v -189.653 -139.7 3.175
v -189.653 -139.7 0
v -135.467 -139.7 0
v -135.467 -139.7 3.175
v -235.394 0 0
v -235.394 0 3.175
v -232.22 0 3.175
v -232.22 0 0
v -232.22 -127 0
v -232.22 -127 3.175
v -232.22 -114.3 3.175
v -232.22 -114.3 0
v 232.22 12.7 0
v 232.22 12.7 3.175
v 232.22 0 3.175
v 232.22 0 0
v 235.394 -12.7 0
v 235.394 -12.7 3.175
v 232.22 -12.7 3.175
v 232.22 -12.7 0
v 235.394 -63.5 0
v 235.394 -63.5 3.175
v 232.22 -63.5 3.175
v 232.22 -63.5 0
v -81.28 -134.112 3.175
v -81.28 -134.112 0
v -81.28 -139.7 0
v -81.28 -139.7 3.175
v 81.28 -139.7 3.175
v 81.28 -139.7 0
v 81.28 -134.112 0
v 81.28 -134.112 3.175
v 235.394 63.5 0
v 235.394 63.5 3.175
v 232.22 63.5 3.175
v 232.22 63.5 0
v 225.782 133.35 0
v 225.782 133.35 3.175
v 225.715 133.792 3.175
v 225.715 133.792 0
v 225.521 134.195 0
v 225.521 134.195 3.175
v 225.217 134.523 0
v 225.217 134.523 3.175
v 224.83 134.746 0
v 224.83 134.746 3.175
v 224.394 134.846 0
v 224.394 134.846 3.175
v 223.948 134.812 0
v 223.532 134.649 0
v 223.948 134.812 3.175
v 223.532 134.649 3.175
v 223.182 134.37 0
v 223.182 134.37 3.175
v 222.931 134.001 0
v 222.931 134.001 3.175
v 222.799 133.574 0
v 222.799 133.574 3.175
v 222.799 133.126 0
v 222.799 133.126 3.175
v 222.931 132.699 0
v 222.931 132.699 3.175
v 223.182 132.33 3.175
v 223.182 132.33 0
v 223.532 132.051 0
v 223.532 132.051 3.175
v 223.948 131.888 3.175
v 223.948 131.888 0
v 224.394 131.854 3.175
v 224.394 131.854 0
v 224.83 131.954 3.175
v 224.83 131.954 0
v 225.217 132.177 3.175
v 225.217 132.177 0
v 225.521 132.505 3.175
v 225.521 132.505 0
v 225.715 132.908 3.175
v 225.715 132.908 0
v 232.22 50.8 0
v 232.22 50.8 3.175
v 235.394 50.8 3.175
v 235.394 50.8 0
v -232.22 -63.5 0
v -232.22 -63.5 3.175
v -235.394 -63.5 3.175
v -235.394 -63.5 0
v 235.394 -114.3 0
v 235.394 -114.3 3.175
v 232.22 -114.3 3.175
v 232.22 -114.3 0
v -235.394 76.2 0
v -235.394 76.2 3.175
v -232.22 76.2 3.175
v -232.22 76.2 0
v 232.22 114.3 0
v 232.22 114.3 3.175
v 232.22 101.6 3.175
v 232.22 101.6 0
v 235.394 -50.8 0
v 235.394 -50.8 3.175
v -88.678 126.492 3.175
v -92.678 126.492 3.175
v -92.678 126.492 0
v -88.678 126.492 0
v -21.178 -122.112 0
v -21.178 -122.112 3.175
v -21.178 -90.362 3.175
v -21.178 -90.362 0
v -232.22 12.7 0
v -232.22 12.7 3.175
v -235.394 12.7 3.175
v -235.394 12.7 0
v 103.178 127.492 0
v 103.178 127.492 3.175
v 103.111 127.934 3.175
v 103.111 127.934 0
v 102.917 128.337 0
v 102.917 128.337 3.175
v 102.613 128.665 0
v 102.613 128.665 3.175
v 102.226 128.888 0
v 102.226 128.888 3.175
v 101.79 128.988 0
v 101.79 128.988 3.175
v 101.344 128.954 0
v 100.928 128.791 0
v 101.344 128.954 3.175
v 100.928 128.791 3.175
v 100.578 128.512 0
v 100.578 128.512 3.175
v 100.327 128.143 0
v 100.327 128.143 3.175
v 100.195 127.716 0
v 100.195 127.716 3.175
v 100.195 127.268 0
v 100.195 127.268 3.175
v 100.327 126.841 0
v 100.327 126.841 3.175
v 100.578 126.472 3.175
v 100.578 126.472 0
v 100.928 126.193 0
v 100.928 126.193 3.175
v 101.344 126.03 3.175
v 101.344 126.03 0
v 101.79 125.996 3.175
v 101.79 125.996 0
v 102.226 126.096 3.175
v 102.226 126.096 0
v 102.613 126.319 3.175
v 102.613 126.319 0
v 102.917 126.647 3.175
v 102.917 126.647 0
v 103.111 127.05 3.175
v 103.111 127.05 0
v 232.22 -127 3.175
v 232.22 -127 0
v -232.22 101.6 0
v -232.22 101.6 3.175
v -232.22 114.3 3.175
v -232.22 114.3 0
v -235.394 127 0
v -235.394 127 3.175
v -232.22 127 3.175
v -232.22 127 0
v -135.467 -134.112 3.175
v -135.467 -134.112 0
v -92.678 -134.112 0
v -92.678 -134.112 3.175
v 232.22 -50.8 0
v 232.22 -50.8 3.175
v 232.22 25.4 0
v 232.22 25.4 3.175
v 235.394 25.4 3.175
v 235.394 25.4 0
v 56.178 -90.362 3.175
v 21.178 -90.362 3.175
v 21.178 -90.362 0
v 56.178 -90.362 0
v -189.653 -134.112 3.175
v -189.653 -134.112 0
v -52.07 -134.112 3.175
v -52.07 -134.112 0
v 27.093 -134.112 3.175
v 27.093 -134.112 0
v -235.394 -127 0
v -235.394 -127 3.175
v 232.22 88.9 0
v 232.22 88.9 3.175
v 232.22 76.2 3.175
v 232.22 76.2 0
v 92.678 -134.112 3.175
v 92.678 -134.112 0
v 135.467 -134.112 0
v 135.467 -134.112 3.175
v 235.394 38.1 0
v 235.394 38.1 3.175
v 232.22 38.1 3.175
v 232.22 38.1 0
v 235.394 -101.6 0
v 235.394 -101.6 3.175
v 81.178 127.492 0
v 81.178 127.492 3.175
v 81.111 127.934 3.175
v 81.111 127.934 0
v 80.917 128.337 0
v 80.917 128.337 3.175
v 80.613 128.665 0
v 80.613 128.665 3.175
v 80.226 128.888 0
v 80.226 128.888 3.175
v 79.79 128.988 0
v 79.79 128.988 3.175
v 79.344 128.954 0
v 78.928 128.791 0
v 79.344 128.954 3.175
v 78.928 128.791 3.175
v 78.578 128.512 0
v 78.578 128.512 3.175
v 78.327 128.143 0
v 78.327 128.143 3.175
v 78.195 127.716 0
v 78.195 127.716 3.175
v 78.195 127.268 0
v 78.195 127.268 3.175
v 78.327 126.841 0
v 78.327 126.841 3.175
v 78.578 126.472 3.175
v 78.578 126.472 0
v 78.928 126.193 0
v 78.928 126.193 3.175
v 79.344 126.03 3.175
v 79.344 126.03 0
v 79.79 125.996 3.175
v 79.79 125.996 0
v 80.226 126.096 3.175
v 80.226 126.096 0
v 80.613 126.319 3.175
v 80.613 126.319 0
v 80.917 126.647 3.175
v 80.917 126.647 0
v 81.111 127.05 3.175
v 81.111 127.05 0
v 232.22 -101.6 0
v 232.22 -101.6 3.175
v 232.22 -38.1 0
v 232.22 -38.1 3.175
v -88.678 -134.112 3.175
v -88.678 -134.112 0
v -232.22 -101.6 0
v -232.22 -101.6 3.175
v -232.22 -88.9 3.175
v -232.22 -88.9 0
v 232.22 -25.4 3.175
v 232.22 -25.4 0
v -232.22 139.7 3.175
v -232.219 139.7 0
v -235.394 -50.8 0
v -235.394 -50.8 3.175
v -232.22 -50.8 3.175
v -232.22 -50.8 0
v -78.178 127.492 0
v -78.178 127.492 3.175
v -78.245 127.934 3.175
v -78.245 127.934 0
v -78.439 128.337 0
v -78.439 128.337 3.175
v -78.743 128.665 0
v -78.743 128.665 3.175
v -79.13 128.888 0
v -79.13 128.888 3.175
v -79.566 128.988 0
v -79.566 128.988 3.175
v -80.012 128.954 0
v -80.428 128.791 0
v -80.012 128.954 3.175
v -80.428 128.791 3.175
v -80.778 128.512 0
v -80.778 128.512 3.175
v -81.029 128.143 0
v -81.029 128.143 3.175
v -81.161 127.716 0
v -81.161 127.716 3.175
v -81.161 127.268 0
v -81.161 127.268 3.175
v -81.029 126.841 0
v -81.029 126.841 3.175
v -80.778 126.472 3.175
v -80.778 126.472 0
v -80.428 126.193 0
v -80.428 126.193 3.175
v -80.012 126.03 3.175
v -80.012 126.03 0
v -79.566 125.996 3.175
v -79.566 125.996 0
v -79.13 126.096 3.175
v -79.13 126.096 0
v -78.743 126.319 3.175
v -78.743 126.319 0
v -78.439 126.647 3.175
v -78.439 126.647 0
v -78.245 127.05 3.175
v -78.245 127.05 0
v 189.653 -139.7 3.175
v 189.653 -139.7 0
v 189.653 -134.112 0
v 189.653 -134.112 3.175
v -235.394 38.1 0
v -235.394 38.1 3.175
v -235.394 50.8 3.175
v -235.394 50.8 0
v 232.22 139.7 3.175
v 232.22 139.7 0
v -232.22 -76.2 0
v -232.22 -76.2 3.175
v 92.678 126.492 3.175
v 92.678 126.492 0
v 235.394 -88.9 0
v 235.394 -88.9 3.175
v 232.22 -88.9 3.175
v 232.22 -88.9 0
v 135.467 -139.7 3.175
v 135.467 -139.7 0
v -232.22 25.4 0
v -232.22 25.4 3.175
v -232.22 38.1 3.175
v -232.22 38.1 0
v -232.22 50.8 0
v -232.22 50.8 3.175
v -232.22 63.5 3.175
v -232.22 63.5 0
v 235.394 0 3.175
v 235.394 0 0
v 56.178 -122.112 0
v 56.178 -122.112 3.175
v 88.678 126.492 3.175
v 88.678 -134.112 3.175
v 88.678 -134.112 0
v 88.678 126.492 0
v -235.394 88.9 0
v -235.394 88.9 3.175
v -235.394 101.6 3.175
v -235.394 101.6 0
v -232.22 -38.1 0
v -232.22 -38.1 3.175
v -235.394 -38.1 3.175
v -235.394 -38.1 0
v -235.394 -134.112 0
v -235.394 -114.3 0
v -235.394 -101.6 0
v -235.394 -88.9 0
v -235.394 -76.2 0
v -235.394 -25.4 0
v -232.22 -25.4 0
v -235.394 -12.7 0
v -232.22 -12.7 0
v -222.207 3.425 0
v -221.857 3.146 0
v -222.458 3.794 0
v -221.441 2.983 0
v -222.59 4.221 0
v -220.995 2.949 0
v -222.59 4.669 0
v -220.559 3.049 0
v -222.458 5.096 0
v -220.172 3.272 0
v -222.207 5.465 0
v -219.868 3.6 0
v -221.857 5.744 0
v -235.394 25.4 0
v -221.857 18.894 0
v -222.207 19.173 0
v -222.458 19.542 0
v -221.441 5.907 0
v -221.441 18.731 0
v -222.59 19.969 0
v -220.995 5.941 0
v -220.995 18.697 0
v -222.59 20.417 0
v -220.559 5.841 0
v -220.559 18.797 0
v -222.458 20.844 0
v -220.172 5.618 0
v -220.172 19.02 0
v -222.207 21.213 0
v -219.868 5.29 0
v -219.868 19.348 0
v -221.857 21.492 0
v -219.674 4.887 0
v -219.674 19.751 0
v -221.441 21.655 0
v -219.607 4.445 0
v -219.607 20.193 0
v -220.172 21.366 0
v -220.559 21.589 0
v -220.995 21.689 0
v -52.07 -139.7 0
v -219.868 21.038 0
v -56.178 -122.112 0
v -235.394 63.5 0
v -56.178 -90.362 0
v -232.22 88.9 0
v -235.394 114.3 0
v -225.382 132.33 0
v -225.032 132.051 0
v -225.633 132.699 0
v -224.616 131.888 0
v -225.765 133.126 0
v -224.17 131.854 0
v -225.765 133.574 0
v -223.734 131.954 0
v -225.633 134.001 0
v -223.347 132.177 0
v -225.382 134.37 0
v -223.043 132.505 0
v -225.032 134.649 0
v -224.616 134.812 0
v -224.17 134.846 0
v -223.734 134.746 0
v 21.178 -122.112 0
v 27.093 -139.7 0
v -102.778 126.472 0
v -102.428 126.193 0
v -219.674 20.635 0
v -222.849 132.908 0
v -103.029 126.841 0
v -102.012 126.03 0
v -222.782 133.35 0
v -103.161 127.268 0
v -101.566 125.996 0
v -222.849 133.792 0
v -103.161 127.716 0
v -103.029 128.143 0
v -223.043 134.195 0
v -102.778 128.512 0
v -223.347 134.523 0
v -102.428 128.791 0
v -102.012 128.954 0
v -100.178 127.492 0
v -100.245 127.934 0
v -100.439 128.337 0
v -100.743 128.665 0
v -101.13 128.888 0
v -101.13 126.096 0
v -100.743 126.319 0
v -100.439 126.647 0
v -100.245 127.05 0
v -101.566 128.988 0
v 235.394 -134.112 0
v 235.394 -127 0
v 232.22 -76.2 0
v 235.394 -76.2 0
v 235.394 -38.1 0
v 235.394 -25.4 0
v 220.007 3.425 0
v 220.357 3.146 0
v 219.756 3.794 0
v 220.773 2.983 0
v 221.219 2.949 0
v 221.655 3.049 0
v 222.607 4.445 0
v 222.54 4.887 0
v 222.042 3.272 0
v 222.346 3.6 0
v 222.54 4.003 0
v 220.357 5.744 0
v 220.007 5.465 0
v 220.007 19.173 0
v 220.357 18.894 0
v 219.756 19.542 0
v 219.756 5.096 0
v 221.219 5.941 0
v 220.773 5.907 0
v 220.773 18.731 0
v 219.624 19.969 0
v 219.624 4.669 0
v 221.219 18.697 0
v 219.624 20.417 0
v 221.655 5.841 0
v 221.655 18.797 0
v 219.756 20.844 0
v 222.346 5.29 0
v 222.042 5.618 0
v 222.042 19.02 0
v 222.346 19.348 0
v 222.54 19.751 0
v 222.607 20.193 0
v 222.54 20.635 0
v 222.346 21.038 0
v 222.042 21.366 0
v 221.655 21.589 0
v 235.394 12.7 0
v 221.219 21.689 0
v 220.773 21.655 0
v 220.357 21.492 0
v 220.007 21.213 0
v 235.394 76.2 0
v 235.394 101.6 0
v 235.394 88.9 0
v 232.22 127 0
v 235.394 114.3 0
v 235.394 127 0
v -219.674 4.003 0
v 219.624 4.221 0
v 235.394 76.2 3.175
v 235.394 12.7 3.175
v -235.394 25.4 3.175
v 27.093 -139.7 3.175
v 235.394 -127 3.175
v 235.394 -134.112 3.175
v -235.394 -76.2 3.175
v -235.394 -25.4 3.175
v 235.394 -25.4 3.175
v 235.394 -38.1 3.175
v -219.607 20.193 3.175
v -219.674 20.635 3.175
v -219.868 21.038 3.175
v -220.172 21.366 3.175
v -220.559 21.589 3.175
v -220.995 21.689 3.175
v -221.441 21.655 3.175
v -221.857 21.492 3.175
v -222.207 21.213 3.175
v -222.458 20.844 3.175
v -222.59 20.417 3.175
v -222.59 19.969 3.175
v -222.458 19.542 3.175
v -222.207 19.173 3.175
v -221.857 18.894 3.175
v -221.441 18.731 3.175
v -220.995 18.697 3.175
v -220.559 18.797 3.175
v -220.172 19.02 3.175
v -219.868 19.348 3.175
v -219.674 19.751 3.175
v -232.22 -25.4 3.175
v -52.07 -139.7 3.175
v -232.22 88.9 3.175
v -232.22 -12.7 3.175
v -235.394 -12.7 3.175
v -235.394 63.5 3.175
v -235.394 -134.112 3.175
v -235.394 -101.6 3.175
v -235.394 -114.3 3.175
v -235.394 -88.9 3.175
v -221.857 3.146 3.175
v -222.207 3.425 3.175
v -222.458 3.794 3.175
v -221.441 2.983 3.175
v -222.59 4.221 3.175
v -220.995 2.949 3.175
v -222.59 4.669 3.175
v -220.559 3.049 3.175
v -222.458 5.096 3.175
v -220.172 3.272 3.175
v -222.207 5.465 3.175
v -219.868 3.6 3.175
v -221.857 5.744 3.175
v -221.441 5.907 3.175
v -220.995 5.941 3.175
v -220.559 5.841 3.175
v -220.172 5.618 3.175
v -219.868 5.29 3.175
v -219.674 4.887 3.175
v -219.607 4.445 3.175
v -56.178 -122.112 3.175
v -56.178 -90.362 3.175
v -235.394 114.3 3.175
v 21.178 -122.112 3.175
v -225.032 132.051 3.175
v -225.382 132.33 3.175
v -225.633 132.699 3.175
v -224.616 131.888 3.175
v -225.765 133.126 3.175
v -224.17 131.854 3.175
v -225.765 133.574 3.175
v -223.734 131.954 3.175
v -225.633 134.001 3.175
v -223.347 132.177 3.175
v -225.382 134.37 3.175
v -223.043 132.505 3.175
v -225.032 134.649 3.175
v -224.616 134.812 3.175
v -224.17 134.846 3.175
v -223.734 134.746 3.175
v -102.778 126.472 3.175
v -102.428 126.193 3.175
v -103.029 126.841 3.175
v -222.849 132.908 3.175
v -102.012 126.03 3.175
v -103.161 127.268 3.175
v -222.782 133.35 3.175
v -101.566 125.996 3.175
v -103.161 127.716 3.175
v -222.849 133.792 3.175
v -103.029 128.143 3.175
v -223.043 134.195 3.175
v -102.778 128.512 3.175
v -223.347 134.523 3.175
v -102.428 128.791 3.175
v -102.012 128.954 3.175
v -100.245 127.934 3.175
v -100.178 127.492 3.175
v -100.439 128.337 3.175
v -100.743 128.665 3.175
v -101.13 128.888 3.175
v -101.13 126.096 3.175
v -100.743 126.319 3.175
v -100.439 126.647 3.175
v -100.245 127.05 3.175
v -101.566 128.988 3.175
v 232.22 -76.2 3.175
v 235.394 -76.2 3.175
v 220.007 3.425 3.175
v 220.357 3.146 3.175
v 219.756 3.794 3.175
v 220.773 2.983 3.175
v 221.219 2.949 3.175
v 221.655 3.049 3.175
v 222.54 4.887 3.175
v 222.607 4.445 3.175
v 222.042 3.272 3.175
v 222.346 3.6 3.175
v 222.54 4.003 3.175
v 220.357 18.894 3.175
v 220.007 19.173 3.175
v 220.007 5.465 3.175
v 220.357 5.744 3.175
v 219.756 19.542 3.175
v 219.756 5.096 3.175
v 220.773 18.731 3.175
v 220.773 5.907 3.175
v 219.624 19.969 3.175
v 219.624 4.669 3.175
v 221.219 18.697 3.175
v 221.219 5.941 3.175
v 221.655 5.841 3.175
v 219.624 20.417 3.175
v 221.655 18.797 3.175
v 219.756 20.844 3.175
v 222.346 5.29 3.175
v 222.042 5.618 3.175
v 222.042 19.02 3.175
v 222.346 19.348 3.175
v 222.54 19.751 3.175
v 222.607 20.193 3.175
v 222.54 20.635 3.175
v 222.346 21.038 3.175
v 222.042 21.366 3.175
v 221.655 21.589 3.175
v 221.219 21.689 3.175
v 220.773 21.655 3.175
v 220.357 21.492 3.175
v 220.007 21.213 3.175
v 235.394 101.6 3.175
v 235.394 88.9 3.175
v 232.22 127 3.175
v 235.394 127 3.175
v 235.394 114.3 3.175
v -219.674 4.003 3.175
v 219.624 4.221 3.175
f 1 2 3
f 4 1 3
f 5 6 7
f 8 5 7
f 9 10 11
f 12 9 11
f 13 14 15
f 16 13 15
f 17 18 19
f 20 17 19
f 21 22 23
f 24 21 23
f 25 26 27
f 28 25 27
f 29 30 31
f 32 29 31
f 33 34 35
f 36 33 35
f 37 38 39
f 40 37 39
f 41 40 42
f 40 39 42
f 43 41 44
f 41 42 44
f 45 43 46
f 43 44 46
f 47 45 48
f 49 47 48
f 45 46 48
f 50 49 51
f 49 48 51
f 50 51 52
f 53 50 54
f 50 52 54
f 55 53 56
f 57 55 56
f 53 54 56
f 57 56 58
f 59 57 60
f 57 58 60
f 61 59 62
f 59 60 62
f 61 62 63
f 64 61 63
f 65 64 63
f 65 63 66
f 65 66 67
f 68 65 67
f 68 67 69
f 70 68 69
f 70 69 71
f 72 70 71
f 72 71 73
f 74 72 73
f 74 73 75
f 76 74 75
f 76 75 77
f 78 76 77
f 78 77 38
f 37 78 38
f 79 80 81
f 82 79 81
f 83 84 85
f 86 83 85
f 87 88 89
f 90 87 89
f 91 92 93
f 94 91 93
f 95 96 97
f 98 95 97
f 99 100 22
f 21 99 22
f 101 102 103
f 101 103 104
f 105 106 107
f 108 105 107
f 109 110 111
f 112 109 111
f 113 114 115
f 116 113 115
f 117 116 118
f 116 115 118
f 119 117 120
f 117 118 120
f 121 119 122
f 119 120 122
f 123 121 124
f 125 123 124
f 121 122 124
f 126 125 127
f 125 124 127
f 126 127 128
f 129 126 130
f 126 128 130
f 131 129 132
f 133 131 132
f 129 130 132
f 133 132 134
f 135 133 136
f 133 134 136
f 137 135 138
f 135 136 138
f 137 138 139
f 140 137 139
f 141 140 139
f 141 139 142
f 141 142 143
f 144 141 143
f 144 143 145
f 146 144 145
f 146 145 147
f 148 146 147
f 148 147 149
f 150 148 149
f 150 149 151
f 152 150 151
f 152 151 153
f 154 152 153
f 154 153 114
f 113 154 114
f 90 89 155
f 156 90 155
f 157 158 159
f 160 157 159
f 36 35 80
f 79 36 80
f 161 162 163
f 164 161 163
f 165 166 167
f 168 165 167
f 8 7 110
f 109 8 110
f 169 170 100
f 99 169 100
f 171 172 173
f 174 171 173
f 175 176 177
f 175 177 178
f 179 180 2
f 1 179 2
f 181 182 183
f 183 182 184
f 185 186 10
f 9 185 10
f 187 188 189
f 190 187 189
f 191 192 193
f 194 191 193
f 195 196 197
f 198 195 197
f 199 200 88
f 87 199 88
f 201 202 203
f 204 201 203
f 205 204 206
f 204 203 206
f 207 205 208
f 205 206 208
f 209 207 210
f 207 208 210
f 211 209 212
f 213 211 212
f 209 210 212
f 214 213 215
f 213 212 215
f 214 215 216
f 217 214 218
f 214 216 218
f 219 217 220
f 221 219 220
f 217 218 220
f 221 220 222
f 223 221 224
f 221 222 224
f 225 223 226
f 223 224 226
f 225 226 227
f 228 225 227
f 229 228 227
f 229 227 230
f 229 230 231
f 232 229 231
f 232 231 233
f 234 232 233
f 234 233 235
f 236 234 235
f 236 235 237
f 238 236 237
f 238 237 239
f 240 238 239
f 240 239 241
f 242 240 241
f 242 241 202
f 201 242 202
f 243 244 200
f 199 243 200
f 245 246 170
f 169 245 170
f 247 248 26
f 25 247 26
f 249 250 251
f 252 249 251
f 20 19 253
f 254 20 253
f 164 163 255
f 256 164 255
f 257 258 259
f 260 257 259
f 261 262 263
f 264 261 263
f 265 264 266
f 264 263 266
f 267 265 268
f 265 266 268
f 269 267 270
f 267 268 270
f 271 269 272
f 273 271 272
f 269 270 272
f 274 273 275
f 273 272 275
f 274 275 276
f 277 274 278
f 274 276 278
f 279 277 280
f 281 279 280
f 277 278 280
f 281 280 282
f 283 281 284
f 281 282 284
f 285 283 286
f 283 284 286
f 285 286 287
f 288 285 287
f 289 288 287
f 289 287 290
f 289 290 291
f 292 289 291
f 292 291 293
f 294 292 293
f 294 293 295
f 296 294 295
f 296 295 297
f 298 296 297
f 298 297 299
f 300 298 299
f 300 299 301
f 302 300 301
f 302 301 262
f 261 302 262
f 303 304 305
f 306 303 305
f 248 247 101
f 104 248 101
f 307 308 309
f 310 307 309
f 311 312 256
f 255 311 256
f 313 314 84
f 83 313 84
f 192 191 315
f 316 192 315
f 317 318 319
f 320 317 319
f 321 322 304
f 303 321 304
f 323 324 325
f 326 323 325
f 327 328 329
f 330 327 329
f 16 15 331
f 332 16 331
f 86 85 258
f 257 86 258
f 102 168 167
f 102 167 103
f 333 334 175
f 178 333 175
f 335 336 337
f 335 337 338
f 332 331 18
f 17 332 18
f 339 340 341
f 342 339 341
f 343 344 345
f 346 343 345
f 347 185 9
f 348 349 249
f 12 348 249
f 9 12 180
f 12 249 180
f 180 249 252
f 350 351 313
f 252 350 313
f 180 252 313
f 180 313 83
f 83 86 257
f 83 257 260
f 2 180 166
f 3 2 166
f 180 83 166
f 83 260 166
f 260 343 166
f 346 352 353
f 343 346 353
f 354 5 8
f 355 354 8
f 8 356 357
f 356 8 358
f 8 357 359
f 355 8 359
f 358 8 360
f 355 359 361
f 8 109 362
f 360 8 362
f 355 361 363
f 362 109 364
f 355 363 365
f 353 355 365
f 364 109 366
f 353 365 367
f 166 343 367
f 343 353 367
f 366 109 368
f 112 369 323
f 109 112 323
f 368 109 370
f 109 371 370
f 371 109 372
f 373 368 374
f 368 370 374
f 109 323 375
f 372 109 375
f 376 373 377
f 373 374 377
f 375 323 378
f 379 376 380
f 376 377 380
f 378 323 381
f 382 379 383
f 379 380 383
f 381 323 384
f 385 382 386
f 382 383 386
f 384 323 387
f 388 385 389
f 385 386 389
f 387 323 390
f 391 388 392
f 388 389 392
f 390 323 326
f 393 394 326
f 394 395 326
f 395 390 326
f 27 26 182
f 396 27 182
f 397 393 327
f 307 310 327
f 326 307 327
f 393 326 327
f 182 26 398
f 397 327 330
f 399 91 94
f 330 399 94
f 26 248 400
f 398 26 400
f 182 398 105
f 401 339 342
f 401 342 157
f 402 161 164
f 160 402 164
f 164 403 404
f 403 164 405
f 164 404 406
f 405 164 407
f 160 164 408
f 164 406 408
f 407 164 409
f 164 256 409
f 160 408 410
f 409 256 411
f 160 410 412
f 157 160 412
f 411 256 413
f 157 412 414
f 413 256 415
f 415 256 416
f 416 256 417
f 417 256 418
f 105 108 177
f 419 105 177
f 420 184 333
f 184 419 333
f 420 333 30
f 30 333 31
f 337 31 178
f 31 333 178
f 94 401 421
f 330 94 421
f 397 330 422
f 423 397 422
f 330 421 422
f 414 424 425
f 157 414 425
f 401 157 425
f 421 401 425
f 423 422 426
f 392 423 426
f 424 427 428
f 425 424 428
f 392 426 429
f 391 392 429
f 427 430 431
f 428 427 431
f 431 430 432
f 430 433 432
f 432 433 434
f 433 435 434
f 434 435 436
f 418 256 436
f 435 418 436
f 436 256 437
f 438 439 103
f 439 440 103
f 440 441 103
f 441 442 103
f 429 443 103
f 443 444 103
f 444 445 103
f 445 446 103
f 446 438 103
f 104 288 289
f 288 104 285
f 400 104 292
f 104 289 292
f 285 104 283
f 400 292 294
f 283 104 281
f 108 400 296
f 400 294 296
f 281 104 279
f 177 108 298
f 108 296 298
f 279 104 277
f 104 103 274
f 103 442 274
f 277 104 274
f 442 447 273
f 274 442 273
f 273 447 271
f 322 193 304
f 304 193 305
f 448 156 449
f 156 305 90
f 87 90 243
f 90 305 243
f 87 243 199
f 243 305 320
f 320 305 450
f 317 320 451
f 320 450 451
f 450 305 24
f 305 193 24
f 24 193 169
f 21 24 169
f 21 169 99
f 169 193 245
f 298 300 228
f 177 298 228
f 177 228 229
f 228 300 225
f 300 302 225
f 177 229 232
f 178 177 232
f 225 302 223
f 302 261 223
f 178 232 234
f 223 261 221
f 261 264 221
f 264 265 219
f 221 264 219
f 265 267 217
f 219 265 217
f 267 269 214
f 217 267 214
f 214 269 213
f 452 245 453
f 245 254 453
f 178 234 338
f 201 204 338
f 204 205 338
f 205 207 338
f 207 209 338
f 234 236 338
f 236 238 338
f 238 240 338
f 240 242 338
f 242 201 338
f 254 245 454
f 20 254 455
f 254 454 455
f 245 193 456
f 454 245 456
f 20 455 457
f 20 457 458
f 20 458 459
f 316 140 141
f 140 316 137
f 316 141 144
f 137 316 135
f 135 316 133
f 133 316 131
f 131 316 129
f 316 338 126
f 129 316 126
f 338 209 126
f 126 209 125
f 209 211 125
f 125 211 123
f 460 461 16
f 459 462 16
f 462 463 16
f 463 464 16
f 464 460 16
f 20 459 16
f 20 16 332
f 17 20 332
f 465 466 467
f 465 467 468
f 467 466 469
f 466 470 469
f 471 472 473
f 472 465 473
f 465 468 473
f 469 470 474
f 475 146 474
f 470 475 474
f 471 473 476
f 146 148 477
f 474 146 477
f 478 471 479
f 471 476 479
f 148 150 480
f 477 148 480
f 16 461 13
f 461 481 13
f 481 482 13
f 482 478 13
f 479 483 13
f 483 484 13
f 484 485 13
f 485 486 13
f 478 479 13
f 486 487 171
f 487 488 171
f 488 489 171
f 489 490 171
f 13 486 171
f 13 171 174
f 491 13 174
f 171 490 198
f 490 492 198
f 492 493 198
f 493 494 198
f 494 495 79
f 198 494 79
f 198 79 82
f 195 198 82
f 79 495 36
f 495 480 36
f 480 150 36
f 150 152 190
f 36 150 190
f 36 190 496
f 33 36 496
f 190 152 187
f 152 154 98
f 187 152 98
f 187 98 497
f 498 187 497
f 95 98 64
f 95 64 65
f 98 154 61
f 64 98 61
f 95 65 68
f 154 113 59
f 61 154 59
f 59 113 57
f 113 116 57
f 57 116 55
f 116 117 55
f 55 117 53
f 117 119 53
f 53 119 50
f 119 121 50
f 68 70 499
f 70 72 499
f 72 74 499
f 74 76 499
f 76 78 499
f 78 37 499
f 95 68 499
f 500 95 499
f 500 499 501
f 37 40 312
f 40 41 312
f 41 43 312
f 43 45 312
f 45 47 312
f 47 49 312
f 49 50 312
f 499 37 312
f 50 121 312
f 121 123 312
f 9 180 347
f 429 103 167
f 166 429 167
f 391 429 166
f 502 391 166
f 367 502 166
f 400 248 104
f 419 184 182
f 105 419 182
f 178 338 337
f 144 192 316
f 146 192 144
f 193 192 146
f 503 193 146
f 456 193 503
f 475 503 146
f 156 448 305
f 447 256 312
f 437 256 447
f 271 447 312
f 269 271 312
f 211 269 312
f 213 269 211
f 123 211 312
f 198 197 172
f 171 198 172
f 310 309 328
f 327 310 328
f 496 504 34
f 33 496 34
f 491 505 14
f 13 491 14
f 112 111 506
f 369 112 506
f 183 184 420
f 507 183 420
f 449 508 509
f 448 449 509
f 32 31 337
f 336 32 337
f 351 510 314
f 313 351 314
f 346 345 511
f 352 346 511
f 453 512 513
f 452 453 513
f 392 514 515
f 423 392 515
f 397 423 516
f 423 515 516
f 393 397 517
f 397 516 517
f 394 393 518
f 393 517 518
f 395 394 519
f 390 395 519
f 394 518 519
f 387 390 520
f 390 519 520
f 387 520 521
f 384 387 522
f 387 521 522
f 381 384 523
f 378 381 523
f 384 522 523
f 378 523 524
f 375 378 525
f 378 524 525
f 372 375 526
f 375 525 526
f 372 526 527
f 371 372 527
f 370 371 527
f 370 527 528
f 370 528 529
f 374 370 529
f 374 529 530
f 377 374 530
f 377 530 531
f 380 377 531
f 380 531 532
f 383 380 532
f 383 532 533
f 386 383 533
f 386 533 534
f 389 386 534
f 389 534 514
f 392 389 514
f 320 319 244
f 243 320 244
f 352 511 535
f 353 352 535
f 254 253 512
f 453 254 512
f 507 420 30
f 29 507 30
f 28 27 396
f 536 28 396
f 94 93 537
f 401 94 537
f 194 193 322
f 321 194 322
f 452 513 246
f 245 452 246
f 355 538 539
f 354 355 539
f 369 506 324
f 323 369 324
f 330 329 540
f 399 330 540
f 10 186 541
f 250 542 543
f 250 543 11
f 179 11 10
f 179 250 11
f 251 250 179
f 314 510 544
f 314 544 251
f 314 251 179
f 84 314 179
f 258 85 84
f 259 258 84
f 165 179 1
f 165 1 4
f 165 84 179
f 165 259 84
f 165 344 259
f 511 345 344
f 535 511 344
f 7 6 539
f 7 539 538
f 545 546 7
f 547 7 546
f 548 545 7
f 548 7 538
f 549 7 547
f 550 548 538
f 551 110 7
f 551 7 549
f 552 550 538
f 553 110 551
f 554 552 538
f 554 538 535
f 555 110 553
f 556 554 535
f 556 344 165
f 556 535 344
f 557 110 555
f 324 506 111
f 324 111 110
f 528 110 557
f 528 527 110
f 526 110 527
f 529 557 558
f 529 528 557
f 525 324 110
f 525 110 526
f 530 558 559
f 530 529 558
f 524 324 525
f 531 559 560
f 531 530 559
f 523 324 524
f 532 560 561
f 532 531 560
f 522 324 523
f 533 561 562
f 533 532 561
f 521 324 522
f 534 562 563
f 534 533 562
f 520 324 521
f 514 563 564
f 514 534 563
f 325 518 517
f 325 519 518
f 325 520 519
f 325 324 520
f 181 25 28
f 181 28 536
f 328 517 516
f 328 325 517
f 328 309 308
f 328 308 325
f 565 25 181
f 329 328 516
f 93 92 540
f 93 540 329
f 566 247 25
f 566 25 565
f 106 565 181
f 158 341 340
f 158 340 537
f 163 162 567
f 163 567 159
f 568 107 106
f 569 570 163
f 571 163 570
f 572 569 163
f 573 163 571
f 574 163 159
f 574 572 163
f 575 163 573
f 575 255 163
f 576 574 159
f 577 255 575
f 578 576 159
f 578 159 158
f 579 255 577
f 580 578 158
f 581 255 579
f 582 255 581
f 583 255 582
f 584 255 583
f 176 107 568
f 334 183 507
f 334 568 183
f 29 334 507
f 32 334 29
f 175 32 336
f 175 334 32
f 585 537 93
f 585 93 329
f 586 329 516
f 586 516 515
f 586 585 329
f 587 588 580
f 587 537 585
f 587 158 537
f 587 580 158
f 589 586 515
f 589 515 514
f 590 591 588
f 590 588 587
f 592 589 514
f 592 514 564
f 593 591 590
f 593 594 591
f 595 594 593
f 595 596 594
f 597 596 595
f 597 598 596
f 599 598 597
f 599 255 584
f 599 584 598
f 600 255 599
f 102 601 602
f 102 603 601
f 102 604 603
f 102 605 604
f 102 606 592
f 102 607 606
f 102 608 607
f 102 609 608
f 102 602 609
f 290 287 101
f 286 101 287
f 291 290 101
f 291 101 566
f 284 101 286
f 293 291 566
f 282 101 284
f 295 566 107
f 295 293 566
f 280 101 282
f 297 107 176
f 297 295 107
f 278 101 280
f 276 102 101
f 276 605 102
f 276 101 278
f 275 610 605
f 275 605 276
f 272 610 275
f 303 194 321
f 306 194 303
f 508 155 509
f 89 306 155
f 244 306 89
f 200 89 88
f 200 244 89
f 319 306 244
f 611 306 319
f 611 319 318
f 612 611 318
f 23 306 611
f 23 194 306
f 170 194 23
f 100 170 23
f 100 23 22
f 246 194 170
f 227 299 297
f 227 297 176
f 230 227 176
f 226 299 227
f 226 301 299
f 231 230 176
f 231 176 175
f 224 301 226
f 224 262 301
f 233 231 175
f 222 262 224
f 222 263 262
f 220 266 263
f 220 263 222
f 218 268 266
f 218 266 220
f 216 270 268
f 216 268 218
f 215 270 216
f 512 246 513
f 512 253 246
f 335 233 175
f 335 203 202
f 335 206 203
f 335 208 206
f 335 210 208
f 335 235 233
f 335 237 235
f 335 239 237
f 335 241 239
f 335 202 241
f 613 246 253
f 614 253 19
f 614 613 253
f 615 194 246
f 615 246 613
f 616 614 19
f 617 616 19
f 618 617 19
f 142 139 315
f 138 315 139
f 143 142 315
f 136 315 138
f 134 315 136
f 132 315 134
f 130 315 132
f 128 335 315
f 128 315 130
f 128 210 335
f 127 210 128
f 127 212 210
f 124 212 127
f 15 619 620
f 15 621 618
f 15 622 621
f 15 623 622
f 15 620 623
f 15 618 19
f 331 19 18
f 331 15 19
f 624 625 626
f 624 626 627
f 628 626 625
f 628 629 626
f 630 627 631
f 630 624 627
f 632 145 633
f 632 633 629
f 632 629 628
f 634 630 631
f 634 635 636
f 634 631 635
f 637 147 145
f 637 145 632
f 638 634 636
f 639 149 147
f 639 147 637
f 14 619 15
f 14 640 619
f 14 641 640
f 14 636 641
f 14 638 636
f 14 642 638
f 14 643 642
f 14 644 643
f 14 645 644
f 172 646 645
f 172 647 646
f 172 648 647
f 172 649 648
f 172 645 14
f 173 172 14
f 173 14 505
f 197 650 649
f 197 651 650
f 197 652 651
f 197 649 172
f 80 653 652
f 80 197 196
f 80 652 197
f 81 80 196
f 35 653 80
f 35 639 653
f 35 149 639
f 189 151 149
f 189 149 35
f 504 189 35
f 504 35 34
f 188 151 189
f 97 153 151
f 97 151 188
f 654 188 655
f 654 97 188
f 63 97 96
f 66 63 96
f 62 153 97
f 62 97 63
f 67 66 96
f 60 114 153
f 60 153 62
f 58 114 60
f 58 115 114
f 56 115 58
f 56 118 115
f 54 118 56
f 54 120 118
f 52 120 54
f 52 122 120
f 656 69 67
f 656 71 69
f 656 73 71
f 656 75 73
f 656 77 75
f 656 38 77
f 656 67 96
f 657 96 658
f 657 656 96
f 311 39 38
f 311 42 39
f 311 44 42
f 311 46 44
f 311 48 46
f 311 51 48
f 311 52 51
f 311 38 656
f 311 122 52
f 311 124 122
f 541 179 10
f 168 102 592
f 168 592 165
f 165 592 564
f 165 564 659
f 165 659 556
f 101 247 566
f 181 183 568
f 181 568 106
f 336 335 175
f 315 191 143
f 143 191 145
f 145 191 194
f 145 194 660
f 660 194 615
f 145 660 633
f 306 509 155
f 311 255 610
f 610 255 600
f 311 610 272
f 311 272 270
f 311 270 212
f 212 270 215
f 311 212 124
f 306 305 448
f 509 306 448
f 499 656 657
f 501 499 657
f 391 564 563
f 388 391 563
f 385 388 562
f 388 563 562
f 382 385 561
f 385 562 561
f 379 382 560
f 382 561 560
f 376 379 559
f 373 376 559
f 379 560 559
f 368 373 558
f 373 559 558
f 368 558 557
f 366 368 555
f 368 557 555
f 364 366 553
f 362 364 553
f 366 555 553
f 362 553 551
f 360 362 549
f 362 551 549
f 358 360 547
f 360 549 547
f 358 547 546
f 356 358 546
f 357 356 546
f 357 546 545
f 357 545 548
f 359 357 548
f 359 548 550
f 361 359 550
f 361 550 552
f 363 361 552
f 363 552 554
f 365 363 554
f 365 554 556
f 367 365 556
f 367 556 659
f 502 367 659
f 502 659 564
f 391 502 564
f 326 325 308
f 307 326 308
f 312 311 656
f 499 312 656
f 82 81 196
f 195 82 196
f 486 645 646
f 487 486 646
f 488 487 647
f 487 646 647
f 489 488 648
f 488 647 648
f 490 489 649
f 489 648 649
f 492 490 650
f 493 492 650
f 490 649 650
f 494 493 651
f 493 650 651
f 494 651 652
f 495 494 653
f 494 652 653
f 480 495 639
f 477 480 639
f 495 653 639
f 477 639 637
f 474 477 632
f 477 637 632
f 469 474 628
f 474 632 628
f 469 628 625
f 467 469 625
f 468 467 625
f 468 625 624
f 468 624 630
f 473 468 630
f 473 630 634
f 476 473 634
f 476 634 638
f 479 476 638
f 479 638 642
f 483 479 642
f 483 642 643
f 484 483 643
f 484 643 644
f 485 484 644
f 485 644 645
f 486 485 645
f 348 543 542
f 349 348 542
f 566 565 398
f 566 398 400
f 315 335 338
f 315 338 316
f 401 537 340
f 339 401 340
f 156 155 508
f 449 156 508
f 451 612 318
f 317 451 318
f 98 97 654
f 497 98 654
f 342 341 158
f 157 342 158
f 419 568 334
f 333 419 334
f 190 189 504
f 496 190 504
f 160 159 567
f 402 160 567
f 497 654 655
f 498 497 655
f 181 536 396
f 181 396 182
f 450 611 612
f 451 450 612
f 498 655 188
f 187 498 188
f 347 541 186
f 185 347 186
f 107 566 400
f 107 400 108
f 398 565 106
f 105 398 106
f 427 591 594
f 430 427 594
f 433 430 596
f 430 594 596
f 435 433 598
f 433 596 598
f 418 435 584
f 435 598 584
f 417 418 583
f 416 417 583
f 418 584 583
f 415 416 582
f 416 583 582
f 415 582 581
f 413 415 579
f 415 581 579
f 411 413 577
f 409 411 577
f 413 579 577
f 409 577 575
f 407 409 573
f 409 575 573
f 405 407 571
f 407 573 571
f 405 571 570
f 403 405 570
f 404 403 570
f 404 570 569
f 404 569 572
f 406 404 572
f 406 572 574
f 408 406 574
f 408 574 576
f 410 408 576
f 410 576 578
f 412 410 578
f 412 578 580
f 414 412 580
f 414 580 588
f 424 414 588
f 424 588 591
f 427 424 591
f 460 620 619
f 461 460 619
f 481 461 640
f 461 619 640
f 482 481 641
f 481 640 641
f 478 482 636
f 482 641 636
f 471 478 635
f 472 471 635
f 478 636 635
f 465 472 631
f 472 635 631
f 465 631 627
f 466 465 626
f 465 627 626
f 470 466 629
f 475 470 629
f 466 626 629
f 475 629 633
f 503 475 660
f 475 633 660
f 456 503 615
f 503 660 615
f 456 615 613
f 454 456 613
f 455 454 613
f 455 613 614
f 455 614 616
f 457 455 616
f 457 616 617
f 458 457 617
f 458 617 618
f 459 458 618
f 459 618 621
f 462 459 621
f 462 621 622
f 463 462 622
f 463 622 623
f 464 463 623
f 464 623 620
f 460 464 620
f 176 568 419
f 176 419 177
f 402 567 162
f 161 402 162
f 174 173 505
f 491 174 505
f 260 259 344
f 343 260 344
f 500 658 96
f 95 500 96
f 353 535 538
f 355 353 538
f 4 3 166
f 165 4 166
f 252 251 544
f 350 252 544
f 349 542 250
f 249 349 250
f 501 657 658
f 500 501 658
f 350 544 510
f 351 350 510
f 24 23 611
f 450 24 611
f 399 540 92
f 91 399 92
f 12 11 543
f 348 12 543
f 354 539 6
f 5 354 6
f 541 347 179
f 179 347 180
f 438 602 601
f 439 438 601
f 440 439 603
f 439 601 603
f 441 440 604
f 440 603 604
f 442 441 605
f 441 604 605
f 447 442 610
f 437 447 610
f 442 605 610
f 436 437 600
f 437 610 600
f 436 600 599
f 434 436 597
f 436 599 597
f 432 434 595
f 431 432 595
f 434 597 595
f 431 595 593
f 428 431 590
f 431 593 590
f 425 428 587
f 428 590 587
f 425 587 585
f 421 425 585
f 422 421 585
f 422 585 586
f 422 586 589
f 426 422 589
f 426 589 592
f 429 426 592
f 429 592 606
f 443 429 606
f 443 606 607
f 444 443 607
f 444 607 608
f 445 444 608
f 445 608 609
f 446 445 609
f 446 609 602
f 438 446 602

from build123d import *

# Parameters (mm, degrees)
SKETCH1_W                    = 3.175
SKETCH1_H                    = 12.7
MAIN_EXTRUDE_DEPTH           = 3.175
SKETCH8_R                    = 1.5
SKETCH8_W                    = 3.175
SKETCH8_H                    = 31.877
MOUNT_HOLES_DEPTH            = 4.175
SKETCH3_W                    = 4
SKETCH3_H                    = 260.604
DOOR_SLOTS_DEPTH             = 10
SKETCH10_R                   = 1.5
DOOR_GUIDE_MOUNT_HOLES_DEPTH = 4.175
SKETCH12_R                   = 1.5
EXTENSION_CLIP_HOLES_DEPTH   = 4.175
EXTENSION_CENTER_CUT_DEPTH   = 4.175
SKETCH17_W                   = 35
SKETCH17_H                   = 31.75
SKETCH17_W_2                 = 24.976666667
SKETCH17_H_2                 = 5.588
NOSEPOKEHOLES_DEPTH          = 10


with BuildPart() as part:
    # Sketch1 → Main Extrude (new body)
    with BuildSketch(Plane.XY):
        Polygon((-243.84, -134.112), (-189.653333333, -134.112), (-189.653333333, -139.7), (-135.466666667, -139.7), (-135.466666667, -134.112), (-81.28, -134.112), (-81.28, -139.7), (-27.093333333, -139.7), (-27.093333333, -134.112), (27.093333333, -134.112), (27.093333333, -139.7), (81.28, -139.7), (81.28, -134.112), (135.466666667, -134.112), (135.466666667, -139.7), (189.653333333, -139.7), (189.653333333, -134.112), (243.84, -134.112), (243.84, -139.7), (298.026666667, -139.7), (298.026666667, -134.112), (352.213333333, -134.112), (352.213333333, -139.7), (406.4, -139.7), (406.4, 139.7), (381, 139.7), (381, 127), (377.825, 127), (377.825, 139.7), (-377.825, 139.7), (-377.825, 127), (-381, 127), (-381, 139.7), (-406.4, 139.7), (-406.4, -139.7), (-352.213333333, -139.7), (-352.213333333, -134.112), (-298.026666667, -134.112), (-298.026666667, -139.7), (-243.84, -139.7), align=None)
        with Locations((-379.4125, -120.65)):
            Rectangle(SKETCH1_W, SKETCH1_H, mode=Mode.SUBTRACT)
        with Locations((-379.4125, -95.25)):
            Rectangle(SKETCH1_W, SKETCH1_H, mode=Mode.SUBTRACT)
        with Locations((379.4125, 82.55)):
            Rectangle(SKETCH1_W, SKETCH1_H, mode=Mode.SUBTRACT)
        with Locations((379.4125, 57.15)):
            Rectangle(SKETCH1_W, SKETCH1_H, mode=Mode.SUBTRACT)
        with Locations((379.4125, 31.75)):
            Rectangle(SKETCH1_W, SKETCH1_H, mode=Mode.SUBTRACT)
        with Locations((379.4125, 6.35)):
            Rectangle(SKETCH1_W, SKETCH1_H, mode=Mode.SUBTRACT)
        with Locations((379.4125, -19.05)):
            Rectangle(SKETCH1_W, SKETCH1_H, mode=Mode.SUBTRACT)
        with Locations((379.4125, -44.45)):
            Rectangle(SKETCH1_W, SKETCH1_H, mode=Mode.SUBTRACT)
        with Locations((379.4125, -69.85)):
            Rectangle(SKETCH1_W, SKETCH1_H, mode=Mode.SUBTRACT)
        with Locations((379.4125, -95.25)):
            Rectangle(SKETCH1_W, SKETCH1_H, mode=Mode.SUBTRACT)
        with Locations((379.4125, -120.65)):
            Rectangle(SKETCH1_W, SKETCH1_H, mode=Mode.SUBTRACT)
        with Locations((-379.4125, -69.85)):
            Rectangle(SKETCH1_W, SKETCH1_H, mode=Mode.SUBTRACT)
        with Locations((-379.4125, -44.45)):
            Rectangle(SKETCH1_W, SKETCH1_H, mode=Mode.SUBTRACT)
        with Locations((-379.4125, -19.05)):
            Rectangle(SKETCH1_W, SKETCH1_H, mode=Mode.SUBTRACT)
        with Locations((-379.4125, 6.35)):
            Rectangle(SKETCH1_W, SKETCH1_H, mode=Mode.SUBTRACT)
        with Locations((-379.4125, 31.75)):
            Rectangle(SKETCH1_W, SKETCH1_H, mode=Mode.SUBTRACT)
        with Locations((-379.4125, 57.15)):
            Rectangle(SKETCH1_W, SKETCH1_H, mode=Mode.SUBTRACT)
        with Locations((-379.4125, 82.55)):
            Rectangle(SKETCH1_W, SKETCH1_H, mode=Mode.SUBTRACT)
        with Locations((-379.4125, 107.95)):
            Rectangle(SKETCH1_W, SKETCH1_H, mode=Mode.SUBTRACT)
        with Locations((379.4125, 107.95)):
            Rectangle(SKETCH1_W, SKETCH1_H, mode=Mode.SUBTRACT)
    extrude(amount=MAIN_EXTRUDE_DEPTH)

    # Sketch8 → Mount Holes (cut, through all)
    with BuildSketch(Plane.XY.offset(3.175)):
        with Locations((-393.7, -120.65)):
            Circle(SKETCH8_R)
        with Locations((393.7, -120.65)):
            Circle(SKETCH8_R)
        with Locations((-382.5875, 12.319)):
            Rectangle(SKETCH8_W, SKETCH8_H)
        with Locations((382.5875, 12.319)):
            Rectangle(SKETCH8_W, SKETCH8_H)
    extrude(amount=-MOUNT_HOLES_DEPTH, mode=Mode.SUBTRACT)

    # Sketch3 → Door Slots (cut)
    with BuildSketch(Plane.XY.offset(3.175)):
        with Locations((-90.678, -3.81)):
            Rectangle(SKETCH3_W, SKETCH3_H)
        with Locations((90.678, -3.81)):
            Rectangle(SKETCH3_W, SKETCH3_H)
    extrude(amount=-DOOR_SLOTS_DEPTH, mode=Mode.SUBTRACT)

    # Sketch10 → Door Guide Mount Holes (cut, through all)
    with BuildSketch(Plane.XY.offset(3.175)):
        with Locations((-101.678, 127.492)):
            Circle(SKETCH10_R)
        with Locations((-79.678, 127.492)):
            Circle(SKETCH10_R)
        with Locations((79.678, 127.492)):
            Circle(SKETCH10_R)
        with Locations((101.678, 127.492)):
            Circle(SKETCH10_R)
    extrude(amount=-DOOR_GUIDE_MOUNT_HOLES_DEPTH, mode=Mode.SUBTRACT)

    # Sketch12 → Extension Clip Holes (cut, through all)
    with BuildSketch(Plane.XY.offset(3.175)):
        with Locations((-246.507, 20.193)):
            Circle(SKETCH12_R)
        with Locations((-246.507, 4.445)):
            Circle(SKETCH12_R)
        with Locations((-221.107, 4.445)):
            Circle(SKETCH12_R)
        with Locations((-221.107, 20.193)):
            Circle(SKETCH12_R)
        with Locations((-243.332, 133.35)):
            Circle(SKETCH12_R)
        with Locations((-224.282, 133.35)):
            Circle(SKETCH12_R)
        with Locations((224.282, 133.35)):
            Circle(SKETCH12_R)
        with Locations((243.332, 133.35)):
            Circle(SKETCH12_R)
        with Locations((221.107, 20.193)):
            Circle(SKETCH12_R)
        with Locations((221.107, 4.445)):
            Circle(SKETCH12_R)
        with Locations((246.507, 4.445)):
            Circle(SKETCH12_R)
        with Locations((246.507, 20.193)):
            Circle(SKETCH12_R)
    extrude(amount=-EXTENSION_CLIP_HOLES_DEPTH, mode=Mode.SUBTRACT)

    # Sketch11_3 → Extension Center Cut (cut, through all)
    with BuildSketch(Plane.XY.offset(3.175)):
        Polygon((-232.2195, 127), (-232.2195, 139.7), (-406.4, 139.7), (-406.4, -139.7), (-235.3945, -139.7), (-235.3945, -127), (-232.2195, -127), (-232.2195, -114.3), (-235.3945, -114.3), (-235.3945, -101.6), (-232.2195, -101.6), (-232.2195, -88.9), (-235.3945, -88.9), (-235.3945, -76.2), (-232.2195, -76.2), (-232.2195, -63.5), (-235.3945, -63.5), (-235.3945, -50.8), (-232.2195, -50.8), (-232.2195, -38.1), (-235.3945, -38.1), (-235.3945, -25.4), (-232.2195, -25.4), (-232.2195, -12.7), (-235.3945, -12.7), (-235.3945, 0), (-232.2195, 0), (-232.2195, 12.7), (-235.3945, 12.7), (-235.3945, 25.4), (-232.2195, 25.4), (-232.2195, 38.1), (-235.3945, 38.1), (-235.3945, 50.8), (-232.2195, 50.8), (-232.2195, 63.5), (-235.3945, 63.5), (-235.3945, 76.2), (-232.2195, 76.2), (-232.2195, 88.9), (-235.3945, 88.9), (-235.3945, 101.6), (-232.2195, 101.6), (-232.2195, 114.3), (-235.3945, 114.3), (-235.3945, 127), align=None)
        Polygon((406.4, 139.7), (232.2195, 139.7), (232.2195, 127), (235.3945, 127), (235.3945, 114.3), (232.2195, 114.3), (232.2195, 101.6), (235.3945, 101.6), (235.3945, 88.9), (232.2195, 88.9), (232.2195, 76.2), (235.3945, 76.2), (235.3945, 63.5), (232.2195, 63.5), (232.2195, 50.8), (235.3945, 50.8), (235.3945, 38.1), (232.2195, 38.1), (232.2195, 25.4), (235.3945, 25.4), (235.3945, 12.7), (232.2195, 12.7), (232.2195, 0), (235.3945, 0), (235.3945, -12.7), (232.2195, -12.7), (232.2195, -25.4), (235.3945, -25.4), (235.3945, -38.1), (232.2195, -38.1), (232.2195, -50.8), (235.3945, -50.8), (235.3945, -63.5), (232.2195, -63.5), (232.2195, -76.2), (235.3945, -76.2), (235.3945, -88.9), (232.2195, -88.9), (232.2195, -101.6), (235.3945, -101.6), (235.3945, -114.3), (232.2195, -114.3), (232.2195, -127), (235.3945, -127), (235.3945, -139.7), (406.4, -139.7), align=None)
    extrude(amount=-EXTENSION_CENTER_CUT_DEPTH, mode=Mode.SUBTRACT)

    # Sketch17 → Nosepokeholes (cut)
    with BuildSketch(Plane.XY.offset(3.175)):
        with Locations((38.678, -106.237)):
            Rectangle(SKETCH17_W, SKETCH17_H)
        with Locations((-38.678, -106.237)):
            Rectangle(SKETCH17_W, SKETCH17_H)
        with Locations((-39.581666666, -136.906)):
            Rectangle(SKETCH17_W_2, SKETCH17_H_2)
    extrude(amount=-NOSEPOKEHOLES_DEPTH, mode=Mode.SUBTRACT)


solid = part.part
